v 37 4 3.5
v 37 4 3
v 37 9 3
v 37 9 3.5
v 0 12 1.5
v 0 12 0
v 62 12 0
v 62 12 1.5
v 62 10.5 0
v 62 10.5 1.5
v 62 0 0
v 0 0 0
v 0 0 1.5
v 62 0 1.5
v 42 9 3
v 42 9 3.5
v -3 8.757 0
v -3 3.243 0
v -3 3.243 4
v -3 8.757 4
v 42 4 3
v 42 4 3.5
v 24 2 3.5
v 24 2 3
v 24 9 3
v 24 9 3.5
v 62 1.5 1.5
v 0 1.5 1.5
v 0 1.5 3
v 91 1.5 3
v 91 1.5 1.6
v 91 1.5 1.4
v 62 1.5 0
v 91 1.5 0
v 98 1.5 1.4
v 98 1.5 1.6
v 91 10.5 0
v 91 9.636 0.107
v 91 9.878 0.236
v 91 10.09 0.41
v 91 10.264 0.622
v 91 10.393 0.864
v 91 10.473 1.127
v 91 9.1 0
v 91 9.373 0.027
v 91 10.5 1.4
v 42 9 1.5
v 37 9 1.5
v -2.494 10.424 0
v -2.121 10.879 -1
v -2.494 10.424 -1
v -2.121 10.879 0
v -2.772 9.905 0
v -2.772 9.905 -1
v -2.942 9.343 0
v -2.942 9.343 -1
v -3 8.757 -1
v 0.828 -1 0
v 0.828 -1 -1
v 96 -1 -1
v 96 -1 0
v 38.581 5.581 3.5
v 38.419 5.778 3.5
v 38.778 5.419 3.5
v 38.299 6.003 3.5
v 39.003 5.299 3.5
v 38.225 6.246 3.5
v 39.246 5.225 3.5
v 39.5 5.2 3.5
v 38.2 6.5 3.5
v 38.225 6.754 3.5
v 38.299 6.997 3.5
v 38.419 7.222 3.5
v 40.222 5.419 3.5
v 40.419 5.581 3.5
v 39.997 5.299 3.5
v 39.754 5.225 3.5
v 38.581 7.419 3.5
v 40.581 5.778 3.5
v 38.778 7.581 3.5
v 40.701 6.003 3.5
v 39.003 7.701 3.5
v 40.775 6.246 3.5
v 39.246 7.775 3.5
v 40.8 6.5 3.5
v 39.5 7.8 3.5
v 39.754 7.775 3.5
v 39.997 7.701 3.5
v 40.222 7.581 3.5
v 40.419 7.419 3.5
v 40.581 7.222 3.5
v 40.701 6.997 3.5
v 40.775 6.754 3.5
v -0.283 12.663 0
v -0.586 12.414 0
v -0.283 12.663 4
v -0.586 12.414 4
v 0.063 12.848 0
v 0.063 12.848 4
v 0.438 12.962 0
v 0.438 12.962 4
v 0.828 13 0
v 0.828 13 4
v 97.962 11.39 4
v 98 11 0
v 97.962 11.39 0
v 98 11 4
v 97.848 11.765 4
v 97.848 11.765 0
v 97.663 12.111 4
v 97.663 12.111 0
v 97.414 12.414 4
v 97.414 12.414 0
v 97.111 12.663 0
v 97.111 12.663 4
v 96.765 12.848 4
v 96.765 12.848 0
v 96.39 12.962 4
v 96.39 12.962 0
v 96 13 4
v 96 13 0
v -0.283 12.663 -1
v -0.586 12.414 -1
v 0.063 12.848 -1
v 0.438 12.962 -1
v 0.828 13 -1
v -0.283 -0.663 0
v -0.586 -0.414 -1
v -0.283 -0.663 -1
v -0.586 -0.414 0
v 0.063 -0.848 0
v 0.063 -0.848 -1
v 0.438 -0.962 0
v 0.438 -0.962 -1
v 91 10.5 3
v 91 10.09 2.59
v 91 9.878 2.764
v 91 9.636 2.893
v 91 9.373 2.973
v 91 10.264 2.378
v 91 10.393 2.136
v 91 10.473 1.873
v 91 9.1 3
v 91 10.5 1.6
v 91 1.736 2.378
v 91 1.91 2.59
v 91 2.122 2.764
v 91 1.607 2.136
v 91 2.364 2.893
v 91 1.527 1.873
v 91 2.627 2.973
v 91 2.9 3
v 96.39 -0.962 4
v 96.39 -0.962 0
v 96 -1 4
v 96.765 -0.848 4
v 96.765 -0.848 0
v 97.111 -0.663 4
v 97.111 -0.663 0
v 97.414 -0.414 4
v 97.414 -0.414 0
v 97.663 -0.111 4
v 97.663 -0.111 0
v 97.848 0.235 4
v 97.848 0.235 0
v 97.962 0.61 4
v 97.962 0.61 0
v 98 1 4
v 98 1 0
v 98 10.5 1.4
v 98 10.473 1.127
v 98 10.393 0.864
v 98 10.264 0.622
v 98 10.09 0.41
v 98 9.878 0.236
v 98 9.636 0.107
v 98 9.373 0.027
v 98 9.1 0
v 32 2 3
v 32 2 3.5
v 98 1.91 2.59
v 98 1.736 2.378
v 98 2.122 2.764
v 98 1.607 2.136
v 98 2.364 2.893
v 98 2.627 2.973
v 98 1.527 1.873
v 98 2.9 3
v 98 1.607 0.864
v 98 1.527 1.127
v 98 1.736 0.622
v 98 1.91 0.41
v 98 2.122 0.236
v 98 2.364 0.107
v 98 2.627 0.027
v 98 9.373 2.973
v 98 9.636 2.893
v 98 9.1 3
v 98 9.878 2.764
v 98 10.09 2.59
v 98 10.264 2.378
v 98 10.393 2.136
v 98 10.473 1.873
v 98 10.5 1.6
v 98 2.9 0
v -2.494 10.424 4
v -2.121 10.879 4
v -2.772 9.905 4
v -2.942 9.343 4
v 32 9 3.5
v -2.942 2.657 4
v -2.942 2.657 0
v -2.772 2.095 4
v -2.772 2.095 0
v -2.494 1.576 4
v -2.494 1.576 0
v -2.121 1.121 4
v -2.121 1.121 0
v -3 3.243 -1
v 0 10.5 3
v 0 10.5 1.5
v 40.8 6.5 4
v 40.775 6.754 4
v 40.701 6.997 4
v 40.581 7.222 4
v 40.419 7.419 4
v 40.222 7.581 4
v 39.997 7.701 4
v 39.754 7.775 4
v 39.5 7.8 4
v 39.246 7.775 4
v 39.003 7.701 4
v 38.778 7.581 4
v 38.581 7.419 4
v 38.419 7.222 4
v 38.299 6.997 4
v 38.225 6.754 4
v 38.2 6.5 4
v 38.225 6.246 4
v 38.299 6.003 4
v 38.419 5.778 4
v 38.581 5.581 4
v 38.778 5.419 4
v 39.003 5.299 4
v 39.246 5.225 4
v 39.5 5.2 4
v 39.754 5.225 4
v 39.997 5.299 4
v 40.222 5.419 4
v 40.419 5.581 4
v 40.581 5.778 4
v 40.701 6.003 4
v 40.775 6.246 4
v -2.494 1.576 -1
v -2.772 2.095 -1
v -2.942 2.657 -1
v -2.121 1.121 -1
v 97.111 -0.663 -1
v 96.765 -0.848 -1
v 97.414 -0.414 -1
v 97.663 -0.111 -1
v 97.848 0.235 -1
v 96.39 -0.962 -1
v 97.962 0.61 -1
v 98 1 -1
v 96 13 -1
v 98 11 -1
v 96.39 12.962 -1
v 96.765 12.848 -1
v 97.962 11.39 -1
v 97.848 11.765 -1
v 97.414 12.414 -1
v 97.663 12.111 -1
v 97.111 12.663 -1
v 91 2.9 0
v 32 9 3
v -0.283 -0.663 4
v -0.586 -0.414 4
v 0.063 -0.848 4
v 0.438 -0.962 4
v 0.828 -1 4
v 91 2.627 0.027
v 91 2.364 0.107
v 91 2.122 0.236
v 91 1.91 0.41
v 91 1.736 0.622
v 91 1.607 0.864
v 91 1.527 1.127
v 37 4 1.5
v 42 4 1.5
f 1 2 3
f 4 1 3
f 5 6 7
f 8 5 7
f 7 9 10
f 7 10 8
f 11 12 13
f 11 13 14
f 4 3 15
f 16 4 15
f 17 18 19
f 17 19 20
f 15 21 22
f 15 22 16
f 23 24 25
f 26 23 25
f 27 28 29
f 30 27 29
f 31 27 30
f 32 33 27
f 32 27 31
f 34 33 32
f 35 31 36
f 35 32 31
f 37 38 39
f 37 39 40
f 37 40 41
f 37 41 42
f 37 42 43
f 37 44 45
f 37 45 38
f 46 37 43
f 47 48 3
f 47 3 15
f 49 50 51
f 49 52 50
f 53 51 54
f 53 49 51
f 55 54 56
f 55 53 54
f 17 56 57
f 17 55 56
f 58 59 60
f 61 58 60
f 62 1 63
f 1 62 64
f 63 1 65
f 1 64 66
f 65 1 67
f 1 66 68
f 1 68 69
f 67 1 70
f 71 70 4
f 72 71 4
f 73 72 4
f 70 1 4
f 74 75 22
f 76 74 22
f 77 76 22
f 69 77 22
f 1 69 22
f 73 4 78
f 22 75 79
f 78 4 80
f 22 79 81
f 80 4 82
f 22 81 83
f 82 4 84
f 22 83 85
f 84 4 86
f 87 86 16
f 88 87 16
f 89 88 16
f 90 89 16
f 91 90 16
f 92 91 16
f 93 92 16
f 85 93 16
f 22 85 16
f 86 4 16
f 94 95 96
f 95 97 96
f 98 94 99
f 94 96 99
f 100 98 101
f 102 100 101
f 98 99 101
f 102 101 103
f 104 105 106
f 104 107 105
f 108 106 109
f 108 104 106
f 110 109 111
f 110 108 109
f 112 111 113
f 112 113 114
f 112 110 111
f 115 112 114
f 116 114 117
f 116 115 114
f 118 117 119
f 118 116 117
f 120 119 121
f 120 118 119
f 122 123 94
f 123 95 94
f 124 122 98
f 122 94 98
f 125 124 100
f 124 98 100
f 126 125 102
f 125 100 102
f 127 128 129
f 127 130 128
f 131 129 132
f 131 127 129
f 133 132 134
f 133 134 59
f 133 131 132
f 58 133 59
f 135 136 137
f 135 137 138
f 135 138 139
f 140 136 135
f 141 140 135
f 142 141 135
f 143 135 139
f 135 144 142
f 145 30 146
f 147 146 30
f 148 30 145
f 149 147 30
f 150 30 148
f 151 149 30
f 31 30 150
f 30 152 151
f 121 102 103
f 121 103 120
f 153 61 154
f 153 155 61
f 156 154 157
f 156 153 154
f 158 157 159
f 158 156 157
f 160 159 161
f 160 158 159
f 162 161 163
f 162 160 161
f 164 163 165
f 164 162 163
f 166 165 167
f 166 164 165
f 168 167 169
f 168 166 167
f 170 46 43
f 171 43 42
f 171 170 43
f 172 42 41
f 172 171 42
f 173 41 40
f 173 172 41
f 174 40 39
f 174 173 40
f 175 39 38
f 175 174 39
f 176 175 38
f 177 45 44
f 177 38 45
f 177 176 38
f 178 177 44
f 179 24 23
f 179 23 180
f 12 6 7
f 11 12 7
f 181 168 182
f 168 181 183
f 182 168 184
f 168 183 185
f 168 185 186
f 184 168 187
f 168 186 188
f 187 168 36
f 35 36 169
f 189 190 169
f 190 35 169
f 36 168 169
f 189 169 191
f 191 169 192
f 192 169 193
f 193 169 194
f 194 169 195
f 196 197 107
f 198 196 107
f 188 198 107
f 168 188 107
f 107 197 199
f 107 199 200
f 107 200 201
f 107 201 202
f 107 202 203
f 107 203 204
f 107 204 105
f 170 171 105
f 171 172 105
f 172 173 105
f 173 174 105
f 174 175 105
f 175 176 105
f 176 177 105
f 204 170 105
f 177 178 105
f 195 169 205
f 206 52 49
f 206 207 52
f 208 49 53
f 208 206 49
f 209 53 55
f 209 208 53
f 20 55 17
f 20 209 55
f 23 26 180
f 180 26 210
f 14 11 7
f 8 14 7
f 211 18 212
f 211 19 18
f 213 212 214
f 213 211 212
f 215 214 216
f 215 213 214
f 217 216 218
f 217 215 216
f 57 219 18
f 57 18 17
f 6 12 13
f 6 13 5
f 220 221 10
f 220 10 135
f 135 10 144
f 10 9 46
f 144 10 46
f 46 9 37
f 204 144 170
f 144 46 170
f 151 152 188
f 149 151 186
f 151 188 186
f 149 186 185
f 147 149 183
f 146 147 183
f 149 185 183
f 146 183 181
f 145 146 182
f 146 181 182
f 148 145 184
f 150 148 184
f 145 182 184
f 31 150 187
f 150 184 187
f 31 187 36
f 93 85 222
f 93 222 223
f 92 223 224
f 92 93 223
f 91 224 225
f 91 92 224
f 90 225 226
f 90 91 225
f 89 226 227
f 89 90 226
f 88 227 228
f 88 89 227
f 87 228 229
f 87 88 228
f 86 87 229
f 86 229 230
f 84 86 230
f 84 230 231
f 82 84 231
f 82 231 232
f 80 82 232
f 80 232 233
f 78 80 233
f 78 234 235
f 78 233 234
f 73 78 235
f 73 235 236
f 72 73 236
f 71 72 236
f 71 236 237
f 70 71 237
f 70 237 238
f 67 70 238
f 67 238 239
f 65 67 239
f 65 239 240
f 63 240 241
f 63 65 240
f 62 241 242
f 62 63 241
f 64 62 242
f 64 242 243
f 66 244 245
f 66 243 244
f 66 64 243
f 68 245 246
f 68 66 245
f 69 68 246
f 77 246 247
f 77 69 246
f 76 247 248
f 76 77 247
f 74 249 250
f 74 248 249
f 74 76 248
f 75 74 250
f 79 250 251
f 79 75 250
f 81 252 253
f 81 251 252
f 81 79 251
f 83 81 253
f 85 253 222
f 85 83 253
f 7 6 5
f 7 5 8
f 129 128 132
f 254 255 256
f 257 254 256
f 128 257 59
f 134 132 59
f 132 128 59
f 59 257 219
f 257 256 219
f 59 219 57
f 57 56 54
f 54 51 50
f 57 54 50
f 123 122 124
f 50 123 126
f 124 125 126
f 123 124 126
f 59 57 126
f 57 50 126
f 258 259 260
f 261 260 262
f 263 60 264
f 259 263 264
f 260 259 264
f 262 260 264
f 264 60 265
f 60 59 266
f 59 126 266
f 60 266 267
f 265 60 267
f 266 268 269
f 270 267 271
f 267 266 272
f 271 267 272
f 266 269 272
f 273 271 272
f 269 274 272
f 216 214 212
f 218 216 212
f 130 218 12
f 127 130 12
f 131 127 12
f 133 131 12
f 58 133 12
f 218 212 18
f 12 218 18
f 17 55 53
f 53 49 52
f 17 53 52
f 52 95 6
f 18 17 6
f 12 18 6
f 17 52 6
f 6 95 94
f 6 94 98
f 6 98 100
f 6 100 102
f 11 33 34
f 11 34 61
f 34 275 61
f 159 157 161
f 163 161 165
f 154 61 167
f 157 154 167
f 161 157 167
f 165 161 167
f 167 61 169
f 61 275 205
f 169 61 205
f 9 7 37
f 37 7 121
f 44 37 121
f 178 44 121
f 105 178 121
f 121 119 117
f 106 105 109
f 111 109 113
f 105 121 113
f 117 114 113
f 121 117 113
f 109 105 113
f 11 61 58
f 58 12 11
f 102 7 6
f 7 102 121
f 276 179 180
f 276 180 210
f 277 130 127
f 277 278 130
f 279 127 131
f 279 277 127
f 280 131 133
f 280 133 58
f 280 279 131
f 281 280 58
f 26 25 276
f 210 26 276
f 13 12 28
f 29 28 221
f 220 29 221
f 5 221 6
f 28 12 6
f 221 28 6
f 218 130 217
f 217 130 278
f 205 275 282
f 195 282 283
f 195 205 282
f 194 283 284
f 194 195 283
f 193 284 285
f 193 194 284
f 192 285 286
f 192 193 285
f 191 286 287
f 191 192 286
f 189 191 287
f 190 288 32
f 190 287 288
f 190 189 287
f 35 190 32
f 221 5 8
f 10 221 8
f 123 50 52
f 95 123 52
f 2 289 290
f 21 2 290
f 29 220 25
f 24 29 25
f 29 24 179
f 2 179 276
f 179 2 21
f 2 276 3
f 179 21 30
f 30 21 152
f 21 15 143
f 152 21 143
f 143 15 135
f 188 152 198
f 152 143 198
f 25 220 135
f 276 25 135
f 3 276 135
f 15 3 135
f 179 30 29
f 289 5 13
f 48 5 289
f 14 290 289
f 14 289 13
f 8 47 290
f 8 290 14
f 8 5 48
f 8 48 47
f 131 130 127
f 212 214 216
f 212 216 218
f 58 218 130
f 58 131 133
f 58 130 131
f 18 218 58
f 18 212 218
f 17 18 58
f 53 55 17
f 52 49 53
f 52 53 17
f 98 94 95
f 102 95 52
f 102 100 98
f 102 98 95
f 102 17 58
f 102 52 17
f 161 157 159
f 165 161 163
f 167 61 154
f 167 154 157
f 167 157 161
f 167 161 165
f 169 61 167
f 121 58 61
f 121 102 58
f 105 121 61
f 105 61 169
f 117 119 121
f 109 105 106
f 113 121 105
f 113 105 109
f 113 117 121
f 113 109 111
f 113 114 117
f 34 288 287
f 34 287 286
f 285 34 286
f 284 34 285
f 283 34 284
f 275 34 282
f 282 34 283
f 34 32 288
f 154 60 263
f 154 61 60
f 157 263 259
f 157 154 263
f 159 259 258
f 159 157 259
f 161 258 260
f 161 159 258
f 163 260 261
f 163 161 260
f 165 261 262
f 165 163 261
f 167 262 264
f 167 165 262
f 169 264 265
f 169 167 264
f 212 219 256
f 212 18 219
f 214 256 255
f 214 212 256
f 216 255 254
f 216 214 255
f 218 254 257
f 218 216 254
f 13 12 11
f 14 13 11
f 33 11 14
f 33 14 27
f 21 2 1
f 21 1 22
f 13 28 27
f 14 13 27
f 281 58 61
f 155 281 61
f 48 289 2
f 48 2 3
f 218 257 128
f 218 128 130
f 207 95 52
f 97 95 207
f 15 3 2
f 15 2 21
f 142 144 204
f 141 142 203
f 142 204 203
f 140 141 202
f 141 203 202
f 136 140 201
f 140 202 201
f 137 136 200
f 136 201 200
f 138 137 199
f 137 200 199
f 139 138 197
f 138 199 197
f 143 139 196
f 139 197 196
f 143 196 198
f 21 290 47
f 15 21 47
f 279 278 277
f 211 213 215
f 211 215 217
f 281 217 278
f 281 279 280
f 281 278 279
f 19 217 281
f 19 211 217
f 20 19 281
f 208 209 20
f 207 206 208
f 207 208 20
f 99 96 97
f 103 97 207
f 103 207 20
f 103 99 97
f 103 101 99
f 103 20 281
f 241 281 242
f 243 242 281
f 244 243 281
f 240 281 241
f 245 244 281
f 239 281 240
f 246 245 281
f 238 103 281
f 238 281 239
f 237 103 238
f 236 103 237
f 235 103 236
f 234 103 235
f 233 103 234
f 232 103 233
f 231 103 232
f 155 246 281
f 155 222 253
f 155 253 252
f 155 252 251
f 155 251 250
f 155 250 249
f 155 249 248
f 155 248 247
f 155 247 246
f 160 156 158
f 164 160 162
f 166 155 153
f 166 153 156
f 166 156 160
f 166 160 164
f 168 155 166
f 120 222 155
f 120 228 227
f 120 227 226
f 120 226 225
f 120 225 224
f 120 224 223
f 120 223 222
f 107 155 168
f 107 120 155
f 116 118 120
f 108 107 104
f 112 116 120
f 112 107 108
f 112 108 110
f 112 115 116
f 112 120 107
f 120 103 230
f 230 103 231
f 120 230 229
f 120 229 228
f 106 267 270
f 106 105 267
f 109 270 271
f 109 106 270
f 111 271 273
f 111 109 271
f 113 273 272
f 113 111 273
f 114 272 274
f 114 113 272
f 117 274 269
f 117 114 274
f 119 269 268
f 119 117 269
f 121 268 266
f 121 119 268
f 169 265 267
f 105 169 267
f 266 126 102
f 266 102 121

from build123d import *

# Parameters (mm, degrees)
BOX001_W        = 5
BOX001_H        = 5
BOX001_DEPTH    = 3
BOX_W           = 62
BOX_H           = 12
BOX_DEPTH       = 1.5
BOX007_W        = 101
BOX007_H        = 14
BOX007_DEPTH    = 1
FILLET006_R     = 2
CHAMFER002_SIZE = 3
CHAMFER003_SIZE = 3
FILLET007_R     = 2
FILLET008_R     = 2
FILLET010_R     = 3
BOX009_W        = 8
BOX009_H        = 7
BOX009_DEPTH    = 9
BOX008_W        = 5
BOX008_H        = 5
BOX008_DEPTH    = 10
CYLINDER_R      = 1.3
CYLINDER_DEPTH  = 10
BOX006_W        = 9
BOX006_H        = 9
BOX006_DEPTH    = 3
FILLET_R        = 1.4
FILLET001_R     = 1.4
BOX005_W        = 5
BOX005_H        = 5
BOX005_DEPTH    = 3
BOX004_W        = 62
BOX004_H        = 12
BOX004_DEPTH    = 1.5
BOX003_W        = 91
BOX003_H        = 9
BOX003_DEPTH    = 3
BOX002_W        = 101
BOX002_H        = 14
BOX002_DEPTH    = 4
FILLET002_R     = 2
FILLET003_R     = 2
CHAMFER_SIZE    = 3
CHAMFER001_SIZE = 3
FILLET004_R     = 2
FILLET005_R     = 2
FILLET009_R     = 3


with BuildPart() as box001:
    # Box001 → Box001 (new body)
    with BuildSketch(Plane(origin=(37, 4, 0), x_dir=(1, 0, 0), z_dir=(0, 0, 1))):
        with Locations((2.5, 2.5)):
            Rectangle(BOX001_W, BOX001_H)
    extrude(amount=BOX001_DEPTH)


with BuildPart() as fusion:
    # Box → Box (new body)
    with BuildSketch(Plane.XY):
        with Locations((31, 6)):
            Rectangle(BOX_W, BOX_H)
    extrude(amount=BOX_DEPTH)

    # Fusion: union Box001
    add(box001.part)


with BuildPart() as fillet010:
    # Box007 → Box007 (new body)
    with BuildSketch(Plane(origin=(-3, -1, -1), x_dir=(1, 0, 0), z_dir=(0, 0, 1))):
        with Locations((50.5, 7)):
            Rectangle(BOX007_W, BOX007_H)
    extrude(amount=BOX007_DEPTH)

    # Fillet006
    fillet006_edges = [fillet010.edges().sort_by_distance(p)[0] for p in [
        (98, -1, -0.5),
        (98, 13, -0.5),
    ]]
    fillet(fillet006_edges, radius=FILLET006_R)

    # Chamfer002
    chamfer002_edges = [fillet010.edges().sort_by_distance(p)[0] for p in [
        (-3, 13, -0.5),
    ]]
    chamfer(chamfer002_edges, length=CHAMFER002_SIZE)

    # Chamfer003
    chamfer003_edges = [fillet010.edges().sort_by_distance(p)[0] for p in [
        (-3, -1, -0.5),
    ]]
    chamfer(chamfer003_edges, length=CHAMFER003_SIZE)

    # Fillet007
    fillet007_edges = [fillet010.edges().sort_by_distance(p)[0] for p in [
        (0, -1, -0.5),
    ]]
    fillet(fillet007_edges, radius=FILLET007_R)

    # Fillet008
    fillet008_edges = [fillet010.edges().sort_by_distance(p)[0] for p in [
        (0, 13, -0.5),
    ]]
    fillet(fillet008_edges, radius=FILLET008_R)

    # Fillet010
    fillet010_edges = [fillet010.edges().sort_by_distance(p)[0] for p in [
        (-3, 10, -0.5),
        (-3, 2, -0.5),
    ]]
    fillet(fillet010_edges, radius=FILLET010_R)


with BuildPart() as box009:
    # Box009 → Box009 (new body)
    with BuildSketch(Plane(origin=(24, 2, -5.5), x_dir=(1, 0, 0), z_dir=(0, 0, 1))):
        with Locations((4, 3.5)):
            Rectangle(BOX009_W, BOX009_H)
    extrude(amount=BOX009_DEPTH)


with BuildPart() as box008:
    # Box008 → Box008 (new body)
    with BuildSketch(Plane(origin=(37, 4, -6.5), x_dir=(1, 0, 0), z_dir=(0, 0, 1))):
        with Locations((2.5, 2.5)):
            Rectangle(BOX008_W, BOX008_H)
    extrude(amount=BOX008_DEPTH)


with BuildPart() as cylinder:
    # Cylinder → Cylinder (new body)
    with BuildSketch(Plane(origin=(39.5, 6.5, 0), x_dir=(1, 0, 0), z_dir=(0, 0, 1))):
        Circle(CYLINDER_R)
    extrude(amount=CYLINDER_DEPTH)


with BuildPart() as fillet001:
    # Box006 → Box006 (new body)
    with BuildSketch(Plane.XY):
        with Locations((4.5, 4.5)):
            Rectangle(BOX006_W, BOX006_H)
    extrude(amount=BOX006_DEPTH)

    # Fillet
    fillet_edges = [fillet001.edges().sort_by_distance(p)[0] for p in [
        (4.5, 9, 0),
        (4.5, 9, 3),
    ]]
    fillet(fillet_edges, radius=FILLET_R)

    # Fillet001
    fillet001_edges = [fillet001.edges().sort_by_distance(p)[0] for p in [
        (4.5, 0, 3),
        (4.5, 0, 0),
    ]]
    fillet(fillet001_edges, radius=FILLET001_R)


with BuildPart() as fillet001_1:
    # Fillet001 placement: moved
    add(fillet001.part.moved(Location((89, 1.5, 0))))


with BuildPart() as box005:
    # Box005 → Box005 (new body)
    with BuildSketch(Plane(origin=(37, 4, 0), x_dir=(1, 0, 0), z_dir=(0, 0, 1))):
        with Locations((2.5, 2.5)):
            Rectangle(BOX005_W, BOX005_H)
    extrude(amount=BOX005_DEPTH)


with BuildPart() as fusion001:
    # Box004 → Box004 (new body)
    with BuildSketch(Plane.XY):
        with Locations((31, 6)):
            Rectangle(BOX004_W, BOX004_H)
    extrude(amount=BOX004_DEPTH)

    # Fusion001: union Box005
    add(box005.part)


with BuildPart() as box003:
    # Box003 → Box003 (new body)
    with BuildSketch(Plane(origin=(0, 1.5, 0), x_dir=(1, 0, 0), z_dir=(0, 0, 1))):
        with Locations((45.5, 4.5)):
            Rectangle(BOX003_W, BOX003_H)
    extrude(amount=BOX003_DEPTH)


with BuildPart() as cut005:
    # Box002 → Box002 (new body)
    with BuildSketch(Plane(origin=(-3, -1, 0), x_dir=(1, 0, 0), z_dir=(0, 0, 1))):
        with Locations((50.5, 7)):
            Rectangle(BOX002_W, BOX002_H)
    extrude(amount=BOX002_DEPTH)

    # Cut: cut Box003
    add(box003.part, mode=Mode.SUBTRACT)

    # Cut001: cut Fusion001
    add(fusion001.part, mode=Mode.SUBTRACT)

    # Cut002: cut Fillet001
    add(fillet001_1.part, mode=Mode.SUBTRACT)

    # Fillet002
    fillet002_edges = [cut005.edges().sort_by_distance(p)[0] for p in [
        (98, -1, 2),
    ]]
    fillet(fillet002_edges, radius=FILLET002_R)

    # Fillet003
    fillet003_edges = [cut005.edges().sort_by_distance(p)[0] for p in [
        (98, 13, 2),
    ]]
    fillet(fillet003_edges, radius=FILLET003_R)

    # Chamfer
    chamfer_edges = [cut005.edges().sort_by_distance(p)[0] for p in [
        (-3, -1, 2),
    ]]
    chamfer(chamfer_edges, length=CHAMFER_SIZE)

    # Chamfer001
    chamfer001_edges = [cut005.edges().sort_by_distance(p)[0] for p in [
        (-3, 13, 2),
    ]]
    chamfer(chamfer001_edges, length=CHAMFER001_SIZE)

    # Fillet004
    fillet004_edges = [cut005.edges().sort_by_distance(p)[0] for p in [
        (0, -1, 2),
    ]]
    fillet(fillet004_edges, radius=FILLET004_R)

    # Fillet005
    fillet005_edges = [cut005.edges().sort_by_distance(p)[0] for p in [
        (0, 13, 2),
    ]]
    fillet(fillet005_edges, radius=FILLET005_R)

    # Fillet009
    fillet009_edges = [cut005.edges().sort_by_distance(p)[0] for p in [
        (-3, 10, 2),
        (-3, 2, 2),
    ]]
    fillet(fillet009_edges, radius=FILLET009_R)

    # Cut003: cut Cylinder
    add(cylinder.part, mode=Mode.SUBTRACT)

    # Cut004: cut Box008
    add(box008.part, mode=Mode.SUBTRACT)

    # Cut005: cut Box009
    add(box009.part, mode=Mode.SUBTRACT)


solid = Compound([fusion.part, fillet010.part, cut005.part])
